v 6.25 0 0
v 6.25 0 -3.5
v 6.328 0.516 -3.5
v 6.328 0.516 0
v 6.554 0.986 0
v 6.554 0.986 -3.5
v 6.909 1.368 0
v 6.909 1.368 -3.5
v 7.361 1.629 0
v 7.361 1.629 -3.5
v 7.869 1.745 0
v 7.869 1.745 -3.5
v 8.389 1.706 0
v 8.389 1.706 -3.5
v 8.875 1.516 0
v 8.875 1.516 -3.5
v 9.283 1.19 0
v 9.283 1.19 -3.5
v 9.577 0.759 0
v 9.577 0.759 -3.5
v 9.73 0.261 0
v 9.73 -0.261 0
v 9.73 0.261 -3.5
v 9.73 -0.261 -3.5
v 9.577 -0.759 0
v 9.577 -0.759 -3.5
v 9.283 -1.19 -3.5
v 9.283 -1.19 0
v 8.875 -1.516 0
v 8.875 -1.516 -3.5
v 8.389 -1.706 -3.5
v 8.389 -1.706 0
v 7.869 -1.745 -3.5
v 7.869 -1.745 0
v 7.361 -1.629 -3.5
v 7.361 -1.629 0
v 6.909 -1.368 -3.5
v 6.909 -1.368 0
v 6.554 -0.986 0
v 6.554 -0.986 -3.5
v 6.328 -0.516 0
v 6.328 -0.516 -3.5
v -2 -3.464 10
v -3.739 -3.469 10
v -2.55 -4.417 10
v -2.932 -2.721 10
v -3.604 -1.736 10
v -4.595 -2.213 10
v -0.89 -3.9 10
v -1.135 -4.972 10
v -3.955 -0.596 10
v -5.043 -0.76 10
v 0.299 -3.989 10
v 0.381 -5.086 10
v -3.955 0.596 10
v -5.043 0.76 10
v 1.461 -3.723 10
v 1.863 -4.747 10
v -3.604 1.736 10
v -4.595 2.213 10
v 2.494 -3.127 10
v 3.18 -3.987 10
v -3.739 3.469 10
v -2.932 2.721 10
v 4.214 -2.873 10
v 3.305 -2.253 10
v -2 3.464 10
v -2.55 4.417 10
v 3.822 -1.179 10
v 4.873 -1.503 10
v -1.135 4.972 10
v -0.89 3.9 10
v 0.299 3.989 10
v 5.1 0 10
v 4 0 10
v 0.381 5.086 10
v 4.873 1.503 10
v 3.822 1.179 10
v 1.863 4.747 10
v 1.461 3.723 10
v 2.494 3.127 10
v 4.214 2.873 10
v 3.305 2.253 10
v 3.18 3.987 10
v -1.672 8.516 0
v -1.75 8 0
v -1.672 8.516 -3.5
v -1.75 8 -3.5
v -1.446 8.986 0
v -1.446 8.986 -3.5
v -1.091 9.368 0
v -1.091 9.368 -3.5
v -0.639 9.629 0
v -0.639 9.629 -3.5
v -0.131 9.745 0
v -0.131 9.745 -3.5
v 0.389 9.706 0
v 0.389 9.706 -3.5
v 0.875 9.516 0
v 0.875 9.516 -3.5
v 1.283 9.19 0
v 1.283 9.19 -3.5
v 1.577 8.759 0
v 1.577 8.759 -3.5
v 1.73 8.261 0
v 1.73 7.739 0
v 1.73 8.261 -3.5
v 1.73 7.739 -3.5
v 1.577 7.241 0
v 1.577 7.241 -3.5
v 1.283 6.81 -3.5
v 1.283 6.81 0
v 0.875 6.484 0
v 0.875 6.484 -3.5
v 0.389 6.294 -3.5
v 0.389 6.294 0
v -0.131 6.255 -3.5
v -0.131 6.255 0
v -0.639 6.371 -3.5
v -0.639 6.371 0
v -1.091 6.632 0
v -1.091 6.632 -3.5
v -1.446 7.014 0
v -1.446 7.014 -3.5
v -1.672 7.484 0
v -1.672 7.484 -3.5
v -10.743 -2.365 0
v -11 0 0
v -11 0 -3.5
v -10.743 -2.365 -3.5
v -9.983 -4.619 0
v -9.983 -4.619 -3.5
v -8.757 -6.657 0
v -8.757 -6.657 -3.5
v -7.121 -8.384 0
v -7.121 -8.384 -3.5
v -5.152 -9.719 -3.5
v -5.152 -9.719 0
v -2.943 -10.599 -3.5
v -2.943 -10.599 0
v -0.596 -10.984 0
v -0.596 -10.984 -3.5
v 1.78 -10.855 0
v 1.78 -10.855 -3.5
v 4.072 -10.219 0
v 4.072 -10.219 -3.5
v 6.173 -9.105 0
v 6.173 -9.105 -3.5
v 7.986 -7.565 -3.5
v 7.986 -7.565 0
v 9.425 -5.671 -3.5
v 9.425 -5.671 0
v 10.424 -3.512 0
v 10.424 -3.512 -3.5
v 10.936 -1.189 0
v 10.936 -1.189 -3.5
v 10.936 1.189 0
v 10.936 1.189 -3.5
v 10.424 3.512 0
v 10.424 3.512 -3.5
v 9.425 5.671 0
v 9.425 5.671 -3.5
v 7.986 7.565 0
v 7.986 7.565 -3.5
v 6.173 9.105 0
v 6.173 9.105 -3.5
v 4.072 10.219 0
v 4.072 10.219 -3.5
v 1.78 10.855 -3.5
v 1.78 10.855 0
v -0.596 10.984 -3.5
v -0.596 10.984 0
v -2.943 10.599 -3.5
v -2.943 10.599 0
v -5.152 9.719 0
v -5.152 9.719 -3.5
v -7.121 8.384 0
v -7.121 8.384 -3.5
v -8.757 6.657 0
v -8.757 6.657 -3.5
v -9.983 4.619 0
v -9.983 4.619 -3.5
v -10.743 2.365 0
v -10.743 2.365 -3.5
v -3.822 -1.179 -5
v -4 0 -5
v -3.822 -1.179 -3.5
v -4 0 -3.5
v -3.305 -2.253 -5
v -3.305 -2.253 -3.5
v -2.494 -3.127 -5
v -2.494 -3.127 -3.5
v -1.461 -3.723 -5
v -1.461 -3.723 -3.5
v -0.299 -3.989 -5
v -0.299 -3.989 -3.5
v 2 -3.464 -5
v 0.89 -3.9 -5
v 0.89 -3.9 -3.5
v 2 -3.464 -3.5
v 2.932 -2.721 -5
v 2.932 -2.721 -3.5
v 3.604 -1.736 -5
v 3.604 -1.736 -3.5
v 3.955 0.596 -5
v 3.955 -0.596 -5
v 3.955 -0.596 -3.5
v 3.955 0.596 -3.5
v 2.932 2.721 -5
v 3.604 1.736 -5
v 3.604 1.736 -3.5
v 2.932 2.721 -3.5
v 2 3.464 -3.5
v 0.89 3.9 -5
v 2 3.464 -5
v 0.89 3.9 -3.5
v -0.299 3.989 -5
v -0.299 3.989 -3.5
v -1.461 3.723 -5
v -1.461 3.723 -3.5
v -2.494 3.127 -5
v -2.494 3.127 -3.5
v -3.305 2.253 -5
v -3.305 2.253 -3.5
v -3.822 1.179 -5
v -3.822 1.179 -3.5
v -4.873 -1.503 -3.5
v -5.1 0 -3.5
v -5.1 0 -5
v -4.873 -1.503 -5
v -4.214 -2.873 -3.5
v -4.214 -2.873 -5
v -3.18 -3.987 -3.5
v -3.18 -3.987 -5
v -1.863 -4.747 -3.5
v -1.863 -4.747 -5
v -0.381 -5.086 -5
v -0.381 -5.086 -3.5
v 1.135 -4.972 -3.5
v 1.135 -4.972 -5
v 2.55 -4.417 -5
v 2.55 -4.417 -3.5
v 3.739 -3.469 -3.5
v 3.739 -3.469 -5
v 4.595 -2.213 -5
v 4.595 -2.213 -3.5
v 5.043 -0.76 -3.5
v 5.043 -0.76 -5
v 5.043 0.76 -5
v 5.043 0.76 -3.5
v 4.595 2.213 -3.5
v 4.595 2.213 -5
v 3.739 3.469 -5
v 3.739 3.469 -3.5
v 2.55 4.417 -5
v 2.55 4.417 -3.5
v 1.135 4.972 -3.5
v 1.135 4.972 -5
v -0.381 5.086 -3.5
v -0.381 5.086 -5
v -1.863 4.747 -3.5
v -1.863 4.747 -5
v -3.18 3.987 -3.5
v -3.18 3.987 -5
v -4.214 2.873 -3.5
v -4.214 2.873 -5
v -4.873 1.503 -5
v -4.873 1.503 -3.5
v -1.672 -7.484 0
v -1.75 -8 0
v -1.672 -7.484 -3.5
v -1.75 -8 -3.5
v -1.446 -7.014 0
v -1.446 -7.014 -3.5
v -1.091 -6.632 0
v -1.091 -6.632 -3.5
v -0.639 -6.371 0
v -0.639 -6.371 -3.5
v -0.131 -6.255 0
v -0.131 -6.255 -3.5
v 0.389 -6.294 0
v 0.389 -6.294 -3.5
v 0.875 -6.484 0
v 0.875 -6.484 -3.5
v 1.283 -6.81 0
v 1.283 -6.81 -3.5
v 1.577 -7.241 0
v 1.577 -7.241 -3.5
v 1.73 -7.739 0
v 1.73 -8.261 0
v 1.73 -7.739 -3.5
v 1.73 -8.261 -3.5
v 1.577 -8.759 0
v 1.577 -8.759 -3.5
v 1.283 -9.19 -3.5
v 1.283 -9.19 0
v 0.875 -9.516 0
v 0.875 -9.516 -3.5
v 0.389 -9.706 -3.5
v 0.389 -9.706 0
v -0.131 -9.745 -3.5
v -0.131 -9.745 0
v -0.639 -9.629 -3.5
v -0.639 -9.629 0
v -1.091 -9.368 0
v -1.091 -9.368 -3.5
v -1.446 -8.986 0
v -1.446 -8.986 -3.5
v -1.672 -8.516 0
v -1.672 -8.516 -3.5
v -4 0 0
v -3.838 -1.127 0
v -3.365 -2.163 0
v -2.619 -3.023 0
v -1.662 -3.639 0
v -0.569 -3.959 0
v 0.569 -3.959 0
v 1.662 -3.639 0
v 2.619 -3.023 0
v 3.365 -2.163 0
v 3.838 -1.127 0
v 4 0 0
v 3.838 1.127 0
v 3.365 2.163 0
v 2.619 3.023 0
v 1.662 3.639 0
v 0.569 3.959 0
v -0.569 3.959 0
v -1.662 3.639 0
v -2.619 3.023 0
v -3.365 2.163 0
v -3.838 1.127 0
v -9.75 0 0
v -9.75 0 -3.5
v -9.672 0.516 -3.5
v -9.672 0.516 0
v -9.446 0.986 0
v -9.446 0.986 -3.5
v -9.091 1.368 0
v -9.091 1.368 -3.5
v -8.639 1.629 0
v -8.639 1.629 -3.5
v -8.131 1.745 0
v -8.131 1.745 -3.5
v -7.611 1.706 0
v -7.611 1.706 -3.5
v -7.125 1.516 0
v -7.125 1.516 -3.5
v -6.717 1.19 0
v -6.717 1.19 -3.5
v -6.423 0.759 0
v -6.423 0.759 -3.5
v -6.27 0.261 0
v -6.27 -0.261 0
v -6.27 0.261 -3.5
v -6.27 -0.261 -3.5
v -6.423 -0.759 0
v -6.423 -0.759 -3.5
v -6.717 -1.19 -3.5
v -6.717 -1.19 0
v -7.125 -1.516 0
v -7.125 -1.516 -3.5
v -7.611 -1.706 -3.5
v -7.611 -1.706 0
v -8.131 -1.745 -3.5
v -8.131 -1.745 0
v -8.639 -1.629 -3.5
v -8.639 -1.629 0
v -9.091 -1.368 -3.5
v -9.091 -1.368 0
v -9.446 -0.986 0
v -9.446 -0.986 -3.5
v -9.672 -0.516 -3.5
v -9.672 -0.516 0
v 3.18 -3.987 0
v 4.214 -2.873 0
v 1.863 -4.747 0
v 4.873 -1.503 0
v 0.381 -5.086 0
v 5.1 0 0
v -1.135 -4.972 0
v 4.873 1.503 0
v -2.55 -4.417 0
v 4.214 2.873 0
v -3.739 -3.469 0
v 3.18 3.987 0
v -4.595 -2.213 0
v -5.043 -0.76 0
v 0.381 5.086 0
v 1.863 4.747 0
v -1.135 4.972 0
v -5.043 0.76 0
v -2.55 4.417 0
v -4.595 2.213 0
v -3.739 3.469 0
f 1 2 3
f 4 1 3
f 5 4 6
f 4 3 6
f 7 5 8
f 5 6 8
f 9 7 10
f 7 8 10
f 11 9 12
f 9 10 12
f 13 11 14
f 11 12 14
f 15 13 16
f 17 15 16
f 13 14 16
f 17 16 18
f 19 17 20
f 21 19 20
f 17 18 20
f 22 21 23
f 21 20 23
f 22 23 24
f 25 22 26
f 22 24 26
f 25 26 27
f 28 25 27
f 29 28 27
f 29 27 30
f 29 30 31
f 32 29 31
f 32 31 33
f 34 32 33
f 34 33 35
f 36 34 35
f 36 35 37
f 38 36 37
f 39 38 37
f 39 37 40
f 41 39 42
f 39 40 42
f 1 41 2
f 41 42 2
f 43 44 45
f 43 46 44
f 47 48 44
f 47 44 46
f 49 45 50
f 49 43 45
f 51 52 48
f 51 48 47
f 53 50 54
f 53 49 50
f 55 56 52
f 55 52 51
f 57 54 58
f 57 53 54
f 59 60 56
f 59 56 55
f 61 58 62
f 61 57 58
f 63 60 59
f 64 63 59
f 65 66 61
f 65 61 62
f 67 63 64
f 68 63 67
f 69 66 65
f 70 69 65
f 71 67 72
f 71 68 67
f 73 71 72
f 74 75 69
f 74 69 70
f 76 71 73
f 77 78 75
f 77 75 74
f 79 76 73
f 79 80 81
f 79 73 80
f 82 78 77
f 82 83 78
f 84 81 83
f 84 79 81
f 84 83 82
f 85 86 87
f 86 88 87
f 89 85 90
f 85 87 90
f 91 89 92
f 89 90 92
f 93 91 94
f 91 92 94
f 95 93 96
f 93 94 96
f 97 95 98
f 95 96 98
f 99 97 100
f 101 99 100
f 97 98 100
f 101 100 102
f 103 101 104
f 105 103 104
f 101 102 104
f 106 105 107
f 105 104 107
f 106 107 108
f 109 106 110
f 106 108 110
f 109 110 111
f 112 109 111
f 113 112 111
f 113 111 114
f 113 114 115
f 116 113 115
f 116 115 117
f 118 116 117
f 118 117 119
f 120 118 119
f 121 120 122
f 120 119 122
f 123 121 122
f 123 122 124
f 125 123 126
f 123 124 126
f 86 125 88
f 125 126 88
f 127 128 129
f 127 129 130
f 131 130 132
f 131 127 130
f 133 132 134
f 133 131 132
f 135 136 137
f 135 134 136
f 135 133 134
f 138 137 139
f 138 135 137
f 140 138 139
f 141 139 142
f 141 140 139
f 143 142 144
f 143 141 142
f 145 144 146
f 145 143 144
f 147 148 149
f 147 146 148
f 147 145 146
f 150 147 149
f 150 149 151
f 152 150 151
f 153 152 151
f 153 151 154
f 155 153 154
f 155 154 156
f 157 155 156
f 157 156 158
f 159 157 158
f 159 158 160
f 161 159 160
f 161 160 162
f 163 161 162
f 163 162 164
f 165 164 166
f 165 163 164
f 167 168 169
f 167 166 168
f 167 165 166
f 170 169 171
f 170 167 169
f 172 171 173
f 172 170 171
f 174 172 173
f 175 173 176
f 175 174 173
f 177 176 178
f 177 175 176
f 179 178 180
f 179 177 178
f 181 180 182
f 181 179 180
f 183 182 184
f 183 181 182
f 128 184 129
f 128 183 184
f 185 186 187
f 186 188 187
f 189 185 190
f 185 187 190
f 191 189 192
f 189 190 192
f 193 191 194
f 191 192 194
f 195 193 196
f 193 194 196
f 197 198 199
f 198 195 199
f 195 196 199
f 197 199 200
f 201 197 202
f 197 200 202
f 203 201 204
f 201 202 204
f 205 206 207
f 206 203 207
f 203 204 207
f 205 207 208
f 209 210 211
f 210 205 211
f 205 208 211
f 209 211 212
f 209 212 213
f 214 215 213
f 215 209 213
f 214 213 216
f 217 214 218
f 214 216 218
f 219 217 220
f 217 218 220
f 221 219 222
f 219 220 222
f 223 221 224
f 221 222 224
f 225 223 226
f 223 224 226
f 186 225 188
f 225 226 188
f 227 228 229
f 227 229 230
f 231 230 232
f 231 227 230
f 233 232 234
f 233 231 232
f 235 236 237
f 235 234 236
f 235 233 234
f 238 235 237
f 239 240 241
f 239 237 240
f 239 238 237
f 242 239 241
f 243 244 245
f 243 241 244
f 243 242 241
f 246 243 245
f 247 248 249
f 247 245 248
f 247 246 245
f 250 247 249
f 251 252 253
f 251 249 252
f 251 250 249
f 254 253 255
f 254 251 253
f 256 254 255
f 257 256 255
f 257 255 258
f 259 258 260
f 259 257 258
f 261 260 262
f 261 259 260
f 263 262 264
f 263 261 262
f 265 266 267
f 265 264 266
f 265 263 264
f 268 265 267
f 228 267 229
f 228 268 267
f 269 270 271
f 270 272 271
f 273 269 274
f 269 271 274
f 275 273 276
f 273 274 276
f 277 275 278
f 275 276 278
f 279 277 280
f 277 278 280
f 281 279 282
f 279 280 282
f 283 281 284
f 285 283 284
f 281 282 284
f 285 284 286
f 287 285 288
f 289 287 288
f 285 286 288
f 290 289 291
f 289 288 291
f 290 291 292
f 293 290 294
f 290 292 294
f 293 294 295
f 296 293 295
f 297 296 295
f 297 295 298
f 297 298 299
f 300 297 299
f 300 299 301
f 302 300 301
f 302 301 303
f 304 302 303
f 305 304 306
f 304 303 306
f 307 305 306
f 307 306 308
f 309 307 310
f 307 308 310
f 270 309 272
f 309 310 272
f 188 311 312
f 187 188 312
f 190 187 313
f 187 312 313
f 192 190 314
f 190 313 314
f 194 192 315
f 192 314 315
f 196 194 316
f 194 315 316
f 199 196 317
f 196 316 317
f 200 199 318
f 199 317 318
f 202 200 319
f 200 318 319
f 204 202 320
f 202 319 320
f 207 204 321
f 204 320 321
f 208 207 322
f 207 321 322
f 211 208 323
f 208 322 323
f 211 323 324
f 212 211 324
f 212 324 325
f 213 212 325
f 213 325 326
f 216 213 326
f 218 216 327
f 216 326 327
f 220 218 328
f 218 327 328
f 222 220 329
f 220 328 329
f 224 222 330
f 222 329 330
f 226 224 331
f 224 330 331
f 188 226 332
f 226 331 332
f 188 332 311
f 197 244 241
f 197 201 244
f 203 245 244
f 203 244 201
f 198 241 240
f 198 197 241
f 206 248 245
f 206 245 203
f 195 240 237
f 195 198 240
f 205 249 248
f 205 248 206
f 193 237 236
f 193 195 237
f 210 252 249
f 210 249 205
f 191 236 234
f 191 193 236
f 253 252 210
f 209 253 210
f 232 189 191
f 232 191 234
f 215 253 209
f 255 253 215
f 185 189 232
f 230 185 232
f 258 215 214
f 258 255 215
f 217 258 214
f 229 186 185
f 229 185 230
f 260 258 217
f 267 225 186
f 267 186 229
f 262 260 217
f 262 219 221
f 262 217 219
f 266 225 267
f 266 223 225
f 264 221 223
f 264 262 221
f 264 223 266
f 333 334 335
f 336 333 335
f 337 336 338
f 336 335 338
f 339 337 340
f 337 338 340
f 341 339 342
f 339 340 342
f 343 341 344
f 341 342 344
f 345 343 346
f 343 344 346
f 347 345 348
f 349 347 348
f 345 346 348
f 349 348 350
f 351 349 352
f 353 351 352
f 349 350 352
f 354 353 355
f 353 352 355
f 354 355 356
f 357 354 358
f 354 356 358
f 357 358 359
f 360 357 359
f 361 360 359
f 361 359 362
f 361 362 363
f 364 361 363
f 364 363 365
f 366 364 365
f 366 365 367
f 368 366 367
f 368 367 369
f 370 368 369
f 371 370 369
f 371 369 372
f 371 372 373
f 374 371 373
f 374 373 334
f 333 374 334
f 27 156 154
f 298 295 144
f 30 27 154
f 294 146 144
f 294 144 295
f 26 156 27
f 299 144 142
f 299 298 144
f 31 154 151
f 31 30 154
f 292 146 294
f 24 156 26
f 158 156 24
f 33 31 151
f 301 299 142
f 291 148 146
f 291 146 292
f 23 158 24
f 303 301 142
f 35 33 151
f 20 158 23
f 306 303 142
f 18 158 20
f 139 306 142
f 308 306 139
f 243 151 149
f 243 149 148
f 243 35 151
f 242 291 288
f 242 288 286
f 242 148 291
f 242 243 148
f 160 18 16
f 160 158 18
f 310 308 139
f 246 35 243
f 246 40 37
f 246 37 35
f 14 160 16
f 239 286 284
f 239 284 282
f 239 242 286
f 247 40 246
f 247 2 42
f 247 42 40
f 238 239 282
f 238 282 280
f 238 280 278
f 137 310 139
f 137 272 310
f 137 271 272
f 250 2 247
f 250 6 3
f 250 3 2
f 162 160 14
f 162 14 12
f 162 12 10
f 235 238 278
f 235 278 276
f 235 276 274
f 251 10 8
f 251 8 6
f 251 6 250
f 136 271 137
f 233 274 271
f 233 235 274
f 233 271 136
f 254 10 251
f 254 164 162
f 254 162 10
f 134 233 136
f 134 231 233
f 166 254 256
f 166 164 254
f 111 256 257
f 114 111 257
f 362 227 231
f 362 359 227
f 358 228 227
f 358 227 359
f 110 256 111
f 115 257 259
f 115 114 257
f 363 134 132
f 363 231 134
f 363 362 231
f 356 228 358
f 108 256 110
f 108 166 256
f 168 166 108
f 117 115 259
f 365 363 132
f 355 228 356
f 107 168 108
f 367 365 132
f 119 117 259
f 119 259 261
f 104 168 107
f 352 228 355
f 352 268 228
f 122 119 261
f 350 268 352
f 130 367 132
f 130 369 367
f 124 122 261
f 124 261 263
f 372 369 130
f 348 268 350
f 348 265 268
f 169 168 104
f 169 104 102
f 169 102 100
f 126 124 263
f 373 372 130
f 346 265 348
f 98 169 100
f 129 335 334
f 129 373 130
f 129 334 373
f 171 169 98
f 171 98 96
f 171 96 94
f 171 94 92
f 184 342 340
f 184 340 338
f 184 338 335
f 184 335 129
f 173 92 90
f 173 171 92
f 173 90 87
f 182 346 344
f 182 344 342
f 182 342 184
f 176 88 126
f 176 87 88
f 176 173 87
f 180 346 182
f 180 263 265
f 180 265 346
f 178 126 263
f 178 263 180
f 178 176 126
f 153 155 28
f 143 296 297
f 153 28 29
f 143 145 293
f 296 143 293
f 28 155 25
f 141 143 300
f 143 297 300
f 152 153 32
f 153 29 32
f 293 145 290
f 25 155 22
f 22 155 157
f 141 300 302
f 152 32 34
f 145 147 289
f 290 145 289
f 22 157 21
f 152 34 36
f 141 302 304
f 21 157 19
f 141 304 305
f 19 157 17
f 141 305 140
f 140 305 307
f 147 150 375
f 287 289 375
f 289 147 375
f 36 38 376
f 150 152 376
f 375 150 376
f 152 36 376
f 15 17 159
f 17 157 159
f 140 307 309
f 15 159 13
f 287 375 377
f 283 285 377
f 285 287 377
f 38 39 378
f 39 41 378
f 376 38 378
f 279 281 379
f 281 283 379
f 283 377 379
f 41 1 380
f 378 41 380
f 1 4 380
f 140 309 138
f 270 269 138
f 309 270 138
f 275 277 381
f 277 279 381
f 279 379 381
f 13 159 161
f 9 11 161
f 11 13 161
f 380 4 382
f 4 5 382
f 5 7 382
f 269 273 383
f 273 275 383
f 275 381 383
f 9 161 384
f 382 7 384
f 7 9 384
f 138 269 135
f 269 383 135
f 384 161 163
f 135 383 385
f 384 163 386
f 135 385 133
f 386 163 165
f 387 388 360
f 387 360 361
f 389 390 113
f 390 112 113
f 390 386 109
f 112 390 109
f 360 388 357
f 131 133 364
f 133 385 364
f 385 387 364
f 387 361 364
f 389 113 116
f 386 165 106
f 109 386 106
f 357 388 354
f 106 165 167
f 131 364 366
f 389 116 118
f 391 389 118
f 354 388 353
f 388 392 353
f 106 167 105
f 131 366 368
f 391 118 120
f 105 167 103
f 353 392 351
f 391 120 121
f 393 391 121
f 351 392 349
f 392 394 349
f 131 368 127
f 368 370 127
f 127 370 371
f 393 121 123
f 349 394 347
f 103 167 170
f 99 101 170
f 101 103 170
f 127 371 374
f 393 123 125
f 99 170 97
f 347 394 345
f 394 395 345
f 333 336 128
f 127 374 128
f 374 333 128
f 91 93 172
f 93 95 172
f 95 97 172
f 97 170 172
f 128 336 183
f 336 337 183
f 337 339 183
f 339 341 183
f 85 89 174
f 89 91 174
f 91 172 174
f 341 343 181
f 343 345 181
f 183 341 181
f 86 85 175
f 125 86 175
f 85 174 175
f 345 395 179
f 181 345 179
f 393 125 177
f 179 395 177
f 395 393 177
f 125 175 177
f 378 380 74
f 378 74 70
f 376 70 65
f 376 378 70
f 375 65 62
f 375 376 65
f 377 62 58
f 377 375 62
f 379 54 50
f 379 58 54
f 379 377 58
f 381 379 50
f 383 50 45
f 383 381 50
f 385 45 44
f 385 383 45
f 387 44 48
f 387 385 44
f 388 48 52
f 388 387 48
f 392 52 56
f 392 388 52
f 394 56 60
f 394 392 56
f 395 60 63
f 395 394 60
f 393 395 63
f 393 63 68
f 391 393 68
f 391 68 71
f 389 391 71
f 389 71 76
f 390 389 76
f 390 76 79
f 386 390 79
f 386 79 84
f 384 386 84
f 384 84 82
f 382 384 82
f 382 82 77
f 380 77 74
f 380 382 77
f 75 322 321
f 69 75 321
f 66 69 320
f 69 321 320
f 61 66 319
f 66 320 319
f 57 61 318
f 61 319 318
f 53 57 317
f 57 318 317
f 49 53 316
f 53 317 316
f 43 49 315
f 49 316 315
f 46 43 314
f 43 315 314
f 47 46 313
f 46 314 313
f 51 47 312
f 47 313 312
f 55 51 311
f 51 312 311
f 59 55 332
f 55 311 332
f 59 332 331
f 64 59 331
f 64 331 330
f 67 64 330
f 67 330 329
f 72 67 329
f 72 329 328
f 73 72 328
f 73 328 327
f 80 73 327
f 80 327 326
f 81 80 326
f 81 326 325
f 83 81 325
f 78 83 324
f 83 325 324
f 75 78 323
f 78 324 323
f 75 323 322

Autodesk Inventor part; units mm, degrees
ref_plane "YZ Plane" through (0, 0, 0) normal (1, 0, 0) x (0, 1, 0)
ref_plane "XZ Plane" through (0, 0, 0) normal (0, 1, 0) x (-1, 0, 0)
ref_plane "XY Plane" through (0, 0, 0) normal (0, 0, 1) x (1, 0, 0)
sketch "Sketch1" plane through (0, 0, 0) normal (0, 0, 1) x (1, 0, 0)
  circle A0 centre (0, 0) radius 5.1
  circle A1 centre (0, 0) radius 4
  dimension "d0" = 10.2
  dimension "d1" = 8
extrude "Extrusion1" add sketch "Sketch1" along normal blind 10
sketch "Sketch2" plane through (0, 0, 0) normal (0, 0, -1) x (-1, 0, 0)
  circle A0 centre (0, 0) radius 4
  circle A1 centre (0, 0) radius 11
  dimension "d4" = 8
  dimension "d5" = 22
extrude "Extrusion2" add sketch "Sketch2" along normal blind 3.5
sketch "Sketch3" plane through (0, 0, -3.5) normal (0, 0, -1) x (-1, 0, 0)
  circle A0 centre (0, 0) radius 4
  circle A1 centre (0, 0) radius 5.1
  dimension "d8" = 8
  dimension "d9" = 10.2
extrude "Extrusion3" add sketch "Sketch3" along normal blind 1.5
sketch "Sketch4" plane through (0, 0, -3.5) normal (0, 0, -1) x (-1, 0, 0)
  circle A0 centre (0, 0) radius 8
  circle A1 centre (0, -8) radius 1.75
  circle A2 centre (8, 0) radius 1.75
  circle A3 centre (0, 8) radius 1.75
  circle A4 centre (-8, 0) radius 1.75
  dimension "d12" = 16
  dimension "d13" = 3.5
  dimension "d16" = 360
extrude "Extrusion4" cut sketch "Sketch4" against normal blind 3.5 contours A0 A2 | A0 A2 | A3 A0 | A0 A3 | A1 A0 | A0 A1 | A4 A0 | A0 A4
properties part number "TUERCA DE HUSILLO"
